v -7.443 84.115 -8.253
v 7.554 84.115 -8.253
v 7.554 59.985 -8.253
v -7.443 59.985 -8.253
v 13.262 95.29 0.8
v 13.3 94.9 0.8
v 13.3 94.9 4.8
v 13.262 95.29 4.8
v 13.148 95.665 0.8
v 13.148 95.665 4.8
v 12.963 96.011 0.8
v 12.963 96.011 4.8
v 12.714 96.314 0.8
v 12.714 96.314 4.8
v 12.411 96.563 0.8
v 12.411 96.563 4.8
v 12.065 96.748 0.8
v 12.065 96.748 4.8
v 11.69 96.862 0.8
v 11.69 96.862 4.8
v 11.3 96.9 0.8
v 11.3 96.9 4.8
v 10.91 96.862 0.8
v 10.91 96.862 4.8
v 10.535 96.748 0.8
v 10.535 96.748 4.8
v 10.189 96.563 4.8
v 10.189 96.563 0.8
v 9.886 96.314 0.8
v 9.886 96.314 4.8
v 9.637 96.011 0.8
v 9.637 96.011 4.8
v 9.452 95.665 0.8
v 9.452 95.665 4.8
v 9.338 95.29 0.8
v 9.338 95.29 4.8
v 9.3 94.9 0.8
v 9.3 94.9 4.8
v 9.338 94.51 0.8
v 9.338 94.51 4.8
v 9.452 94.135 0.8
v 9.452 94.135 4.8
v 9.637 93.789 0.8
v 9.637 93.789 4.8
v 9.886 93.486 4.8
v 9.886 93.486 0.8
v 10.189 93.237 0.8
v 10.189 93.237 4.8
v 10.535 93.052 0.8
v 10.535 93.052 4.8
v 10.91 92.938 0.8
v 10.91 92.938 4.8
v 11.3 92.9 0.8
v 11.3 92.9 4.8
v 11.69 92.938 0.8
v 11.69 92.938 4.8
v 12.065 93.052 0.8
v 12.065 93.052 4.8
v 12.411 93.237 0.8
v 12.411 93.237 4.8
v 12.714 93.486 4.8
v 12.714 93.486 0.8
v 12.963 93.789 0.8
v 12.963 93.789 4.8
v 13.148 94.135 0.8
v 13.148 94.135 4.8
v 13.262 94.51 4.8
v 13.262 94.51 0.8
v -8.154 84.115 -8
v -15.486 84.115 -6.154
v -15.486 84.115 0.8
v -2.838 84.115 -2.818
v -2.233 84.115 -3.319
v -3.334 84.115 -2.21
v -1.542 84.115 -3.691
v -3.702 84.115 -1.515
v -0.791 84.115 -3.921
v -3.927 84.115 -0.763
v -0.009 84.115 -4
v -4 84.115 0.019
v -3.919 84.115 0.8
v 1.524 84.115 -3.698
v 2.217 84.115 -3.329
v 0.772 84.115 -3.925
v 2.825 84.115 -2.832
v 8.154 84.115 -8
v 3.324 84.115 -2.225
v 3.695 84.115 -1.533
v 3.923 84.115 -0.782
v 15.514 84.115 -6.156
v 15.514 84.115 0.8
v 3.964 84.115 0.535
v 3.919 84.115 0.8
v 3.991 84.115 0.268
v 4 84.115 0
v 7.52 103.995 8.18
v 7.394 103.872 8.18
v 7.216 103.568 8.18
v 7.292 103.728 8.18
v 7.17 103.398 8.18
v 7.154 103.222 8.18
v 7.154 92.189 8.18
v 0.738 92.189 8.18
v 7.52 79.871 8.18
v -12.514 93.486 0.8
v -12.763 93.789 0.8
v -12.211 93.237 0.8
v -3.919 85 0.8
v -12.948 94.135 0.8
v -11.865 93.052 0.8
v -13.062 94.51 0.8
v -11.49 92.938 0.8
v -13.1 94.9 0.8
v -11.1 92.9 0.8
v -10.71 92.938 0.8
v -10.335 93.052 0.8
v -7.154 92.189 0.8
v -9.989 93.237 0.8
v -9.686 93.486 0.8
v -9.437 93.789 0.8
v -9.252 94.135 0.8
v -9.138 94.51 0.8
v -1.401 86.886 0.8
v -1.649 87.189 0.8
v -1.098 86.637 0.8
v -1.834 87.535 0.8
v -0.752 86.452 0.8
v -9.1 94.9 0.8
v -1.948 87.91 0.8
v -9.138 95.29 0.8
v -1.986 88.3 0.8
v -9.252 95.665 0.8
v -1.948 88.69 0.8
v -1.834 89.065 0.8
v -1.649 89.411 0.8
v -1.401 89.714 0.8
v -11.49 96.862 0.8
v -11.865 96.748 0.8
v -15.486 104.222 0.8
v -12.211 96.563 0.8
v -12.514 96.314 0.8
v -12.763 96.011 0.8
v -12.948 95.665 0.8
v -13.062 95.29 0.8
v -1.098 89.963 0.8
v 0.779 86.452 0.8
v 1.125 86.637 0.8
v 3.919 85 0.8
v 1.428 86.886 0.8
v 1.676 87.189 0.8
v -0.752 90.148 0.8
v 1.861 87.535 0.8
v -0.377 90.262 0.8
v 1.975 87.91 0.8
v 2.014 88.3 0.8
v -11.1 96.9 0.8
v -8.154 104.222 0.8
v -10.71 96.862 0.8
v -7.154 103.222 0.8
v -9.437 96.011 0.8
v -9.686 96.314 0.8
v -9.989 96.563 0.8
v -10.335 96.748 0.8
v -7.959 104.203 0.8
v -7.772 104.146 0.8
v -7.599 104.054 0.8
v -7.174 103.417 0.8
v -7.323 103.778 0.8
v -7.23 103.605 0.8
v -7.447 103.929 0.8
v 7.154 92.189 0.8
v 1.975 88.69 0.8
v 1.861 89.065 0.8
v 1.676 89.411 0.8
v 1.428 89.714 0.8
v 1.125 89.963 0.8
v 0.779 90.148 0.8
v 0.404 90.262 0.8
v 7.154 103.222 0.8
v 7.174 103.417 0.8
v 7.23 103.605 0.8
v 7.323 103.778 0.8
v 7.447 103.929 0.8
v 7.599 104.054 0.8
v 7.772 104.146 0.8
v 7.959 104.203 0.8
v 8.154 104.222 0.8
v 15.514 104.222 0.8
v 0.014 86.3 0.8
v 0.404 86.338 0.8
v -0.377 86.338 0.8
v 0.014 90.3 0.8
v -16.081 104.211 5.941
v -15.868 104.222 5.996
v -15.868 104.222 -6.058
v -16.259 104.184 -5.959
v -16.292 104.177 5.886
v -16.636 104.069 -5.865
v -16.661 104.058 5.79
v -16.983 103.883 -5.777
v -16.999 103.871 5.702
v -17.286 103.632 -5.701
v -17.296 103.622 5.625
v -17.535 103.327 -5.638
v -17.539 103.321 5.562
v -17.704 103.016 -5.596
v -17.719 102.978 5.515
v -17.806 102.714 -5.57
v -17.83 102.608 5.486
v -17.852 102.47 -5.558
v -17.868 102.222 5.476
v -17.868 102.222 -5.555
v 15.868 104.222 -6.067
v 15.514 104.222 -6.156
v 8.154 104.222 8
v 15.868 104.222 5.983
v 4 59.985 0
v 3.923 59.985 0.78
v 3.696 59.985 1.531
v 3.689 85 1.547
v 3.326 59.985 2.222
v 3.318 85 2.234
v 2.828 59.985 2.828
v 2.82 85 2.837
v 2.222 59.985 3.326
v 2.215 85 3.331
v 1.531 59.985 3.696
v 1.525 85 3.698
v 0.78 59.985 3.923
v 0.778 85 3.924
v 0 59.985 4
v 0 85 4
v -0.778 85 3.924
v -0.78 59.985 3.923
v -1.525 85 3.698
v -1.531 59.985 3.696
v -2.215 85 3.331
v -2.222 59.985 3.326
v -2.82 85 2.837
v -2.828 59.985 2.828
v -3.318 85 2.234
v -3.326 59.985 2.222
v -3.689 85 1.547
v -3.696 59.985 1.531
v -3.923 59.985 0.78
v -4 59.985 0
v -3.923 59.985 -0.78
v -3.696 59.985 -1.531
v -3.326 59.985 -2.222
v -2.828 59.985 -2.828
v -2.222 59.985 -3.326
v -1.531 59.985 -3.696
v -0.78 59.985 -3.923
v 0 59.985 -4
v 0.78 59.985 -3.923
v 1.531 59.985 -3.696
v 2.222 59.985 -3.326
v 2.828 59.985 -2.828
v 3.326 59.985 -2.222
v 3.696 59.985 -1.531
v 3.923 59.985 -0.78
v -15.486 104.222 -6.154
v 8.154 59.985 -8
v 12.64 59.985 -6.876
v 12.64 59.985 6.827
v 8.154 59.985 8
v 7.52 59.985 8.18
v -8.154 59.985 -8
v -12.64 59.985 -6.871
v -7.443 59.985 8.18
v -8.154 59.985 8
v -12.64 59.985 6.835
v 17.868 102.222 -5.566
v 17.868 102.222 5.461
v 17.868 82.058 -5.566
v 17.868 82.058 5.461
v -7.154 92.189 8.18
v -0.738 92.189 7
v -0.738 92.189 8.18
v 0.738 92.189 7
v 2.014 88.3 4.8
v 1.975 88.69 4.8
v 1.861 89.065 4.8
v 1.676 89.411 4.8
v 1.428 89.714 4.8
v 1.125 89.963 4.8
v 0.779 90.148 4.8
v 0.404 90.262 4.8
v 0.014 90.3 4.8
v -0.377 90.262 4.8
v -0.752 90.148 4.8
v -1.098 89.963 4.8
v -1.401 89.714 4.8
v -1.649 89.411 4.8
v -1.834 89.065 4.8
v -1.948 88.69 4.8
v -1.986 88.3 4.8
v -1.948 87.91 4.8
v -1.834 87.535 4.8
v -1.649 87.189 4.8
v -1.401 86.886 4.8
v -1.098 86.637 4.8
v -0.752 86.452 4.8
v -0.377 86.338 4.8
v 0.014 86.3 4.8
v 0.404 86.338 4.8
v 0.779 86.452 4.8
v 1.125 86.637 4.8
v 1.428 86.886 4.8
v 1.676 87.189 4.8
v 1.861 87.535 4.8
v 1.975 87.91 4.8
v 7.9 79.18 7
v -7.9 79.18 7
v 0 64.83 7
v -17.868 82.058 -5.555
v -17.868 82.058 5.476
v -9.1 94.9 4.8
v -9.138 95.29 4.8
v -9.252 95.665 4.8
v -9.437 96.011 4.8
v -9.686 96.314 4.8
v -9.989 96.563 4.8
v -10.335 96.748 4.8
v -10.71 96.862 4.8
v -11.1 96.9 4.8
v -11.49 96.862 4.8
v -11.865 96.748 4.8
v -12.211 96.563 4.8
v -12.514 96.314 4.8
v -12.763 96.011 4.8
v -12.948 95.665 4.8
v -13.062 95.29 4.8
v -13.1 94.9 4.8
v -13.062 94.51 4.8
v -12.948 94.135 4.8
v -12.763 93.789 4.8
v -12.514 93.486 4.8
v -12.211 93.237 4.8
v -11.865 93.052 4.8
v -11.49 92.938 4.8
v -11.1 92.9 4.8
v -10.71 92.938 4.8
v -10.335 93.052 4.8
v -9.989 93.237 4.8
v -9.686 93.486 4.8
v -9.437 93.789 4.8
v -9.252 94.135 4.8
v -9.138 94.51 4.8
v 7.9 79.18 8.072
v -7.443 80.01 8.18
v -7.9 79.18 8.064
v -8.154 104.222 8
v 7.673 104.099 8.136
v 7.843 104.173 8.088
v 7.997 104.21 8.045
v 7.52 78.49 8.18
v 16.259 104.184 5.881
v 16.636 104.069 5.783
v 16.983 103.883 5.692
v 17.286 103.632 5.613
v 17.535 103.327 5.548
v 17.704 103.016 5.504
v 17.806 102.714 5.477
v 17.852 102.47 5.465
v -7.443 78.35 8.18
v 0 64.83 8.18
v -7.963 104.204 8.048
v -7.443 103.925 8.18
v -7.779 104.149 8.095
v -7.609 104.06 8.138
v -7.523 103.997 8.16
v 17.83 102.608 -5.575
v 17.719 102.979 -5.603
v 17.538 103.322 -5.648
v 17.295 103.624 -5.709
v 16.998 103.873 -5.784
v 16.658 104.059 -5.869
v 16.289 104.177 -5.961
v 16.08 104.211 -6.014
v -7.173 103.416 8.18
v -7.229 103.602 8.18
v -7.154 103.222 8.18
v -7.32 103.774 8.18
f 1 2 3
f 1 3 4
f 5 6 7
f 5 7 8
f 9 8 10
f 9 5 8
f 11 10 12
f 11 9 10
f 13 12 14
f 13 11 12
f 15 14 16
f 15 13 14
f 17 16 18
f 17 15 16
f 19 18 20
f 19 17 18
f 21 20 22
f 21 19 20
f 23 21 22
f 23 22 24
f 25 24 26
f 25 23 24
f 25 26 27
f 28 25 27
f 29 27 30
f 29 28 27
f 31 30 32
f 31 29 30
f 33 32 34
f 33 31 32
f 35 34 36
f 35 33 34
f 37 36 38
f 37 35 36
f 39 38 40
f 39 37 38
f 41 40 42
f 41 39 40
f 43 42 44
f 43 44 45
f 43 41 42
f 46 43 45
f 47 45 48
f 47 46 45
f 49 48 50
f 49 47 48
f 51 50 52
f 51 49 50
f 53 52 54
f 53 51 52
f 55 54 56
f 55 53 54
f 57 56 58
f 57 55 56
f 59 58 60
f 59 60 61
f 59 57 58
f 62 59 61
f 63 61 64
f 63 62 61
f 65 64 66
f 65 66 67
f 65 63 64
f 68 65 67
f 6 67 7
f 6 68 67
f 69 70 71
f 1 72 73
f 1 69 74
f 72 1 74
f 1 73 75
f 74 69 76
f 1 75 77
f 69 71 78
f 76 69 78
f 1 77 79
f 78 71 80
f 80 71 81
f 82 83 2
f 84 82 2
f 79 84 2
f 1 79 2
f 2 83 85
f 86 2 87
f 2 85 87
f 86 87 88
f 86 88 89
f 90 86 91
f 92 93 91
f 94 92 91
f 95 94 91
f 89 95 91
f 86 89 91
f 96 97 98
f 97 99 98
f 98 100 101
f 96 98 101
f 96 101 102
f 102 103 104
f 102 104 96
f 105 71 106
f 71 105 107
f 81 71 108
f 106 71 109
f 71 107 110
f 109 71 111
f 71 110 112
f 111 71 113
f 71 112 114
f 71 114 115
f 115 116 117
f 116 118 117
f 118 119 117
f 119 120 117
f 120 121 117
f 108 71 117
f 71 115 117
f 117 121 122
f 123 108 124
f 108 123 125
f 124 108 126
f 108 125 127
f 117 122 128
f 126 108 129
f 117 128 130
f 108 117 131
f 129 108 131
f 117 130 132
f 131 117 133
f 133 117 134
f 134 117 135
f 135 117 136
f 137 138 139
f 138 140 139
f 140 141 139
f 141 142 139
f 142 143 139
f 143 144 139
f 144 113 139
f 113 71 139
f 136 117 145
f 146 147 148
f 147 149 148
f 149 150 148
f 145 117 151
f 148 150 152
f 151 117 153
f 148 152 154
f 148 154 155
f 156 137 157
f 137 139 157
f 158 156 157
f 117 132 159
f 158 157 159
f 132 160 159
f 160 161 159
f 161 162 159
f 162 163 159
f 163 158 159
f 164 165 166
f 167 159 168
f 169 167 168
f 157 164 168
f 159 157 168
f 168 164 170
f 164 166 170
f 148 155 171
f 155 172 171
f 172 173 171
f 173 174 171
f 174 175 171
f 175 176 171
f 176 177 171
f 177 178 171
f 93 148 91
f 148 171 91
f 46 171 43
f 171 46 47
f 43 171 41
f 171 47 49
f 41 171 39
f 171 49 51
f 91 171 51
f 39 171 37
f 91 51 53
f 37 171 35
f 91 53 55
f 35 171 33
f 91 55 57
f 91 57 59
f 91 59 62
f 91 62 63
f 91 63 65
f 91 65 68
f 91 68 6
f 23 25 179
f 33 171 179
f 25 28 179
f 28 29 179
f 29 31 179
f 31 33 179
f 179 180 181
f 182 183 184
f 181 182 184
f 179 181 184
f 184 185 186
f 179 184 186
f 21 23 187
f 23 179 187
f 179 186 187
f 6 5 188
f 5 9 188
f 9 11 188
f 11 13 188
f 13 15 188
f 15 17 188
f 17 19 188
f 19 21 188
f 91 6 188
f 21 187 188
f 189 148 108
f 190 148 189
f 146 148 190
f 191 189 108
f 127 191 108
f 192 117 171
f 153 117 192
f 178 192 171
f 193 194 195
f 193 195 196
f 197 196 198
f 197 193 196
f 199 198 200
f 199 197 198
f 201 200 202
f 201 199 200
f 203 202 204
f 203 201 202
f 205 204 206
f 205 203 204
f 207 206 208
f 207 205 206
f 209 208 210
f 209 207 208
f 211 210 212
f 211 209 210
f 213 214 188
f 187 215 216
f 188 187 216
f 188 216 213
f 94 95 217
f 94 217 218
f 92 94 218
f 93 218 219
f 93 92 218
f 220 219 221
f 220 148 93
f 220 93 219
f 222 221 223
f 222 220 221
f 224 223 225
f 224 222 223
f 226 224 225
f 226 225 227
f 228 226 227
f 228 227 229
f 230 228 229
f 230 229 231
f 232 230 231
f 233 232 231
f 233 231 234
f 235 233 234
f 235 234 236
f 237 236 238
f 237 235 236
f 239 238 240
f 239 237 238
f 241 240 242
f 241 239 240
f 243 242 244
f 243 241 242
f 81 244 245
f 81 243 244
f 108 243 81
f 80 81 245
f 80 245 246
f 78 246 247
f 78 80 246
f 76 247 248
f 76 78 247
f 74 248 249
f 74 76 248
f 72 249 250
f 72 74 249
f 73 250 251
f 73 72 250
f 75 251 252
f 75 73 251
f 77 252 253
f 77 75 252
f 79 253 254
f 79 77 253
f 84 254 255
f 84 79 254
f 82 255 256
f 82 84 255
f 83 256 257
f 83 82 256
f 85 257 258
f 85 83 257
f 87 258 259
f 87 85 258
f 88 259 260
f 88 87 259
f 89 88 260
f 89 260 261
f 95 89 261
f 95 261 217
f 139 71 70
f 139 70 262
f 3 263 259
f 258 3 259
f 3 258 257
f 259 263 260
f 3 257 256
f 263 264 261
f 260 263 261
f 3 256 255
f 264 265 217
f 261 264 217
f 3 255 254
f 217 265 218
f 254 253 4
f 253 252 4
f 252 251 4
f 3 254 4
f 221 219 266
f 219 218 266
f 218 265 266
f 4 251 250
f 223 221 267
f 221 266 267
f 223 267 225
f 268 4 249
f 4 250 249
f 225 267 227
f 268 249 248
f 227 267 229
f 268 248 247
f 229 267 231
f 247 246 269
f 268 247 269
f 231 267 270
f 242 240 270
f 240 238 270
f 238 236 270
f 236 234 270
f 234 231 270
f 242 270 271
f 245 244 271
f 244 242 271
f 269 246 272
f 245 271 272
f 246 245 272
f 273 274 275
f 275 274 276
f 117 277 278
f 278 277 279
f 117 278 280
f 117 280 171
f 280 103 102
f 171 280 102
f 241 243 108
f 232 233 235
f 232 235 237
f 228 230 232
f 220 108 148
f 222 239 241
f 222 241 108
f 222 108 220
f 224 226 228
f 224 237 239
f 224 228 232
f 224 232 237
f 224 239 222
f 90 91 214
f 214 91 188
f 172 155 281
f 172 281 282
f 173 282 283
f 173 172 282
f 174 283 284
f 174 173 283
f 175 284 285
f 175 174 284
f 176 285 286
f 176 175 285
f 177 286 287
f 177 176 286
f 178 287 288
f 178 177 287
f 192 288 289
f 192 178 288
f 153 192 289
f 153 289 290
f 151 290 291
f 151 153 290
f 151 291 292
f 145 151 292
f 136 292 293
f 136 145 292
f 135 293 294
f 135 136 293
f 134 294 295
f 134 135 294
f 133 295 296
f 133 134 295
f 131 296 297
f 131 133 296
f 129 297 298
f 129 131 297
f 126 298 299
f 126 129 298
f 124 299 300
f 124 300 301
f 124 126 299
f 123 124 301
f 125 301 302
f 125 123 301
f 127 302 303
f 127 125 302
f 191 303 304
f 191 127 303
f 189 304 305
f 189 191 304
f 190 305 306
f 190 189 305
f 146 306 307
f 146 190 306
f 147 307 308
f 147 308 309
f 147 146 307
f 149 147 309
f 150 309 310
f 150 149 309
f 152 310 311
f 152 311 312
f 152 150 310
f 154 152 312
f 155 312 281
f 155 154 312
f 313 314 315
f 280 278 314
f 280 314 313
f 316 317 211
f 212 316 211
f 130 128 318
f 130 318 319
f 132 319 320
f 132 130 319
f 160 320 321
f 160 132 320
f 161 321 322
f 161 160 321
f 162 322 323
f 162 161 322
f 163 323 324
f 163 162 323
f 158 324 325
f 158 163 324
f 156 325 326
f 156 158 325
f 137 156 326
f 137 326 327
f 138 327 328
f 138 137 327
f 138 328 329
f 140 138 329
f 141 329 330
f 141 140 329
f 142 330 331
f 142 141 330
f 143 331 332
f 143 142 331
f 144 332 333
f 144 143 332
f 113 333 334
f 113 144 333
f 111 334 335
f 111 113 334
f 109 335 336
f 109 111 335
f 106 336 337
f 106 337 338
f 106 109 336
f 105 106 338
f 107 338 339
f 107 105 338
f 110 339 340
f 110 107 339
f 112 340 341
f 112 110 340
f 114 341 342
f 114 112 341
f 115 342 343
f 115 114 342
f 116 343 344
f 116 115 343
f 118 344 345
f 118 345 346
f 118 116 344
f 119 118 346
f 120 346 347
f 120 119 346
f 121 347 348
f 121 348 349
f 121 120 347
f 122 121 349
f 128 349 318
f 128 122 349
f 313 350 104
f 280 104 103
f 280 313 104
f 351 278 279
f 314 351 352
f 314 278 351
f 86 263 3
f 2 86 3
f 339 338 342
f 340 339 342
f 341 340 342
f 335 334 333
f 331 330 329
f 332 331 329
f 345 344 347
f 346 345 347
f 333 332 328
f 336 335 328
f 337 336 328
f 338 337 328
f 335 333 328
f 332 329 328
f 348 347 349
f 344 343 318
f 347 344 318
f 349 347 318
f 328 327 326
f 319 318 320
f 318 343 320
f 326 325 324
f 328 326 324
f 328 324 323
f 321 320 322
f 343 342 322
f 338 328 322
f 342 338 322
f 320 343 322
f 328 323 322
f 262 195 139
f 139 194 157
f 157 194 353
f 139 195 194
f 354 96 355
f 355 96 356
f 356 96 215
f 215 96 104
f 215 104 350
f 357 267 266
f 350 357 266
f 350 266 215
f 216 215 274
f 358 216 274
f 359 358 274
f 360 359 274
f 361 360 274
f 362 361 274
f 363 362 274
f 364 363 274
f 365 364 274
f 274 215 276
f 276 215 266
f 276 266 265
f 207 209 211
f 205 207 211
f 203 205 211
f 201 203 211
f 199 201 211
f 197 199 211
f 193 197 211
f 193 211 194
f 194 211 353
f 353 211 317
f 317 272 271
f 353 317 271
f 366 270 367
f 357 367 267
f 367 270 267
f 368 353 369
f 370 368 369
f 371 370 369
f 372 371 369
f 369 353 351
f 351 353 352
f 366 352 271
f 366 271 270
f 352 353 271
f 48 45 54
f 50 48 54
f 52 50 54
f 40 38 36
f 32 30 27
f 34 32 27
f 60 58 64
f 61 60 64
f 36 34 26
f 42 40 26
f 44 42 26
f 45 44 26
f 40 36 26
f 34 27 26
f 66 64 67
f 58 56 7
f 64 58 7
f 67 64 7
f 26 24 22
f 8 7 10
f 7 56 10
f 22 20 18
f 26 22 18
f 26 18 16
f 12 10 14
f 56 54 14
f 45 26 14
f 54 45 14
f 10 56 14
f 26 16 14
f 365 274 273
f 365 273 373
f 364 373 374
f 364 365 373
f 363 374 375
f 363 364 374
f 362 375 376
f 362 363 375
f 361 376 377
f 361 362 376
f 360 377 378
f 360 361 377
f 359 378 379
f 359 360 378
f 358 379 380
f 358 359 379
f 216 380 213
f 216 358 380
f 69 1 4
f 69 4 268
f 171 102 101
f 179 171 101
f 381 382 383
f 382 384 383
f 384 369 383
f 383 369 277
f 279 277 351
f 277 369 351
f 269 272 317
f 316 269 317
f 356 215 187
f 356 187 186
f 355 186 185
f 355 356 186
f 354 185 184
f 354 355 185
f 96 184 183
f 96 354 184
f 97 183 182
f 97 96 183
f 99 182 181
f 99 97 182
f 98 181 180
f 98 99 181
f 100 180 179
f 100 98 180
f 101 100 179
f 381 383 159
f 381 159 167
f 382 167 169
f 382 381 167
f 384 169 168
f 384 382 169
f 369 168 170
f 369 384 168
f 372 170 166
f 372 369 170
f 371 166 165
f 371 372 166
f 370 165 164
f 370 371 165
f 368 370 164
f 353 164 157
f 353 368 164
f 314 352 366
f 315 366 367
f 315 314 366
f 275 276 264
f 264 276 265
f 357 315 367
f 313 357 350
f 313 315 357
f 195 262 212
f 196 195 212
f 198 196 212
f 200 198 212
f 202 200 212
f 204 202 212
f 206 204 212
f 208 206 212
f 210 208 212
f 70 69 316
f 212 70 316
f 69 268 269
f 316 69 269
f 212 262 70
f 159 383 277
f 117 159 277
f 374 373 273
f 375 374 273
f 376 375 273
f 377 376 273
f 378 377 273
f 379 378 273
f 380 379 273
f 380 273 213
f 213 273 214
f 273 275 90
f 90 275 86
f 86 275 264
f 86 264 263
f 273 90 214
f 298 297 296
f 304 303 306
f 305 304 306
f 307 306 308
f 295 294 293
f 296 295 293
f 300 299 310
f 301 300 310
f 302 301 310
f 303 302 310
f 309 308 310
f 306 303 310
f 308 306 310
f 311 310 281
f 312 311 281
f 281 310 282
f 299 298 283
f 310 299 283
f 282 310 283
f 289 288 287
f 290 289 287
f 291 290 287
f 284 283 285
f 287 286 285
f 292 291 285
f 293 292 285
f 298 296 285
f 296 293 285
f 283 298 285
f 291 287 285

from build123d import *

# Parameters (mm, degrees)
PAD_DEPTH       = 12
POCKET_DEPTH    = 62
SKETCH019_W     = 31
SKETCH019_H     = 21.780884
POCKET002_DEPTH = 17
SKETCH020_R     = 2
POCKET003_DEPTH = 4
CYLINDER_R      = 4
CYLINDER_DEPTH  = 28
POCKET032_DEPTH = 5


with BuildPart() as part:
    # Sketch010 → Pad (new body, symmetric)
    with BuildSketch(Plane.XY):
        with BuildLine():
            Line((12.639868, 59.984547), (-12.639868, 59.984547))
            Line((-12.639868, 59.984547), (-17.867889, 82.058411))
            Line((-17.867889, 82.058411), (-17.867889, 102.222236))
            ThreePointArc((-15.867889, 104.222236), (-17.282103, 103.63645), (-17.867889, 102.222236))
            Line((-15.867889, 104.222236), (-8.154342, 104.222236))
            ThreePointArc((-7.154342, 103.222236), (-7.447235, 103.929343), (-8.154342, 104.222236))
            Line((-7.154342, 103.222236), (-7.154342, 92.189331))
            Line((-7.154342, 92.189331), (7.154342, 92.189331))
            Line((7.154342, 92.189331), (7.154342, 103.222236))
            ThreePointArc((8.154342, 104.222236), (7.447235, 103.929343), (7.154342, 103.222236))
            Line((8.154342, 104.222236), (15.867889, 104.222236))
            ThreePointArc((17.867889, 102.222236), (17.282103, 103.63645), (15.867889, 104.222236))
            Line((17.867889, 102.222236), (17.867889, 82.058411))
            Line((17.867889, 82.058411), (12.639868, 59.984547))
        make_face()
    extrude(amount=PAD_DEPTH, both=True)

    # Sketch011 → Pocket (cut)
    with BuildSketch(Plane.XZ.offset(-54)):
        Polygon((0, 13.813917), (-22.117895, 13.813917), (-22.117895, -0.189388), (-22.117895, -17.743416), (0, -17.743416), (22.658901, -17.743416), (22.658901, -0.111897), (22.658901, 13.813917), align=None)
        Polygon((-18.596464, 0), (-18.596464, 5.287208), (-8.154342, 8), (-7.443202, 8.179805), (0, 8.179805), (7.519913, 8.179805), (8.154342, 8), (18.531284, 5.287208), (18.531284, -0.112287), (18.531284, -5.399495), (8.154342, -8), (7.554242, -8.253323), (0.11104, -8.253323), (-7.443202, -8.253323), (-8.154342, -8), (-18.596464, -5.371119), align=None, mode=Mode.SUBTRACT)
    extrude(amount=-POCKET_DEPTH, mode=Mode.SUBTRACT)

    # Sketch019 → Pocket002 (cut)
    with BuildSketch(Plane.XY.offset(0.8)):
        with Locations((0.01352, 95.005211)):
            Rectangle(SKETCH019_W, SKETCH019_H)
    extrude(amount=-POCKET002_DEPTH, mode=Mode.SUBTRACT)

    # Sketch020 → Pocket003 (cut)
    with BuildSketch(Plane.XY.offset(0.8)):
        with Locations((-11.1, 94.9)):
            Circle(SKETCH020_R)
        with Locations((11.3, 94.9)):
            Circle(SKETCH020_R)
        with Locations((0.013518, 88.3)):
            Circle(SKETCH020_R)
    extrude(amount=POCKET003_DEPTH, mode=Mode.SUBTRACT)

    # Cylinder → Cylinder (cut)
    with BuildSketch(Plane.XZ.offset(-85)):
        Circle(CYLINDER_R)
    extrude(amount=CYLINDER_DEPTH, mode=Mode.SUBTRACT)

    # Sketch067 → Pocket032 (cut)
    with BuildSketch(Plane.XY.offset(7)):
        Polygon((-7.9, 79.180206), (0, 64.83), (7.9, 79.180206), (0, 93.53), align=None)
    extrude(amount=POCKET032_DEPTH, mode=Mode.SUBTRACT)


solid = part.part
